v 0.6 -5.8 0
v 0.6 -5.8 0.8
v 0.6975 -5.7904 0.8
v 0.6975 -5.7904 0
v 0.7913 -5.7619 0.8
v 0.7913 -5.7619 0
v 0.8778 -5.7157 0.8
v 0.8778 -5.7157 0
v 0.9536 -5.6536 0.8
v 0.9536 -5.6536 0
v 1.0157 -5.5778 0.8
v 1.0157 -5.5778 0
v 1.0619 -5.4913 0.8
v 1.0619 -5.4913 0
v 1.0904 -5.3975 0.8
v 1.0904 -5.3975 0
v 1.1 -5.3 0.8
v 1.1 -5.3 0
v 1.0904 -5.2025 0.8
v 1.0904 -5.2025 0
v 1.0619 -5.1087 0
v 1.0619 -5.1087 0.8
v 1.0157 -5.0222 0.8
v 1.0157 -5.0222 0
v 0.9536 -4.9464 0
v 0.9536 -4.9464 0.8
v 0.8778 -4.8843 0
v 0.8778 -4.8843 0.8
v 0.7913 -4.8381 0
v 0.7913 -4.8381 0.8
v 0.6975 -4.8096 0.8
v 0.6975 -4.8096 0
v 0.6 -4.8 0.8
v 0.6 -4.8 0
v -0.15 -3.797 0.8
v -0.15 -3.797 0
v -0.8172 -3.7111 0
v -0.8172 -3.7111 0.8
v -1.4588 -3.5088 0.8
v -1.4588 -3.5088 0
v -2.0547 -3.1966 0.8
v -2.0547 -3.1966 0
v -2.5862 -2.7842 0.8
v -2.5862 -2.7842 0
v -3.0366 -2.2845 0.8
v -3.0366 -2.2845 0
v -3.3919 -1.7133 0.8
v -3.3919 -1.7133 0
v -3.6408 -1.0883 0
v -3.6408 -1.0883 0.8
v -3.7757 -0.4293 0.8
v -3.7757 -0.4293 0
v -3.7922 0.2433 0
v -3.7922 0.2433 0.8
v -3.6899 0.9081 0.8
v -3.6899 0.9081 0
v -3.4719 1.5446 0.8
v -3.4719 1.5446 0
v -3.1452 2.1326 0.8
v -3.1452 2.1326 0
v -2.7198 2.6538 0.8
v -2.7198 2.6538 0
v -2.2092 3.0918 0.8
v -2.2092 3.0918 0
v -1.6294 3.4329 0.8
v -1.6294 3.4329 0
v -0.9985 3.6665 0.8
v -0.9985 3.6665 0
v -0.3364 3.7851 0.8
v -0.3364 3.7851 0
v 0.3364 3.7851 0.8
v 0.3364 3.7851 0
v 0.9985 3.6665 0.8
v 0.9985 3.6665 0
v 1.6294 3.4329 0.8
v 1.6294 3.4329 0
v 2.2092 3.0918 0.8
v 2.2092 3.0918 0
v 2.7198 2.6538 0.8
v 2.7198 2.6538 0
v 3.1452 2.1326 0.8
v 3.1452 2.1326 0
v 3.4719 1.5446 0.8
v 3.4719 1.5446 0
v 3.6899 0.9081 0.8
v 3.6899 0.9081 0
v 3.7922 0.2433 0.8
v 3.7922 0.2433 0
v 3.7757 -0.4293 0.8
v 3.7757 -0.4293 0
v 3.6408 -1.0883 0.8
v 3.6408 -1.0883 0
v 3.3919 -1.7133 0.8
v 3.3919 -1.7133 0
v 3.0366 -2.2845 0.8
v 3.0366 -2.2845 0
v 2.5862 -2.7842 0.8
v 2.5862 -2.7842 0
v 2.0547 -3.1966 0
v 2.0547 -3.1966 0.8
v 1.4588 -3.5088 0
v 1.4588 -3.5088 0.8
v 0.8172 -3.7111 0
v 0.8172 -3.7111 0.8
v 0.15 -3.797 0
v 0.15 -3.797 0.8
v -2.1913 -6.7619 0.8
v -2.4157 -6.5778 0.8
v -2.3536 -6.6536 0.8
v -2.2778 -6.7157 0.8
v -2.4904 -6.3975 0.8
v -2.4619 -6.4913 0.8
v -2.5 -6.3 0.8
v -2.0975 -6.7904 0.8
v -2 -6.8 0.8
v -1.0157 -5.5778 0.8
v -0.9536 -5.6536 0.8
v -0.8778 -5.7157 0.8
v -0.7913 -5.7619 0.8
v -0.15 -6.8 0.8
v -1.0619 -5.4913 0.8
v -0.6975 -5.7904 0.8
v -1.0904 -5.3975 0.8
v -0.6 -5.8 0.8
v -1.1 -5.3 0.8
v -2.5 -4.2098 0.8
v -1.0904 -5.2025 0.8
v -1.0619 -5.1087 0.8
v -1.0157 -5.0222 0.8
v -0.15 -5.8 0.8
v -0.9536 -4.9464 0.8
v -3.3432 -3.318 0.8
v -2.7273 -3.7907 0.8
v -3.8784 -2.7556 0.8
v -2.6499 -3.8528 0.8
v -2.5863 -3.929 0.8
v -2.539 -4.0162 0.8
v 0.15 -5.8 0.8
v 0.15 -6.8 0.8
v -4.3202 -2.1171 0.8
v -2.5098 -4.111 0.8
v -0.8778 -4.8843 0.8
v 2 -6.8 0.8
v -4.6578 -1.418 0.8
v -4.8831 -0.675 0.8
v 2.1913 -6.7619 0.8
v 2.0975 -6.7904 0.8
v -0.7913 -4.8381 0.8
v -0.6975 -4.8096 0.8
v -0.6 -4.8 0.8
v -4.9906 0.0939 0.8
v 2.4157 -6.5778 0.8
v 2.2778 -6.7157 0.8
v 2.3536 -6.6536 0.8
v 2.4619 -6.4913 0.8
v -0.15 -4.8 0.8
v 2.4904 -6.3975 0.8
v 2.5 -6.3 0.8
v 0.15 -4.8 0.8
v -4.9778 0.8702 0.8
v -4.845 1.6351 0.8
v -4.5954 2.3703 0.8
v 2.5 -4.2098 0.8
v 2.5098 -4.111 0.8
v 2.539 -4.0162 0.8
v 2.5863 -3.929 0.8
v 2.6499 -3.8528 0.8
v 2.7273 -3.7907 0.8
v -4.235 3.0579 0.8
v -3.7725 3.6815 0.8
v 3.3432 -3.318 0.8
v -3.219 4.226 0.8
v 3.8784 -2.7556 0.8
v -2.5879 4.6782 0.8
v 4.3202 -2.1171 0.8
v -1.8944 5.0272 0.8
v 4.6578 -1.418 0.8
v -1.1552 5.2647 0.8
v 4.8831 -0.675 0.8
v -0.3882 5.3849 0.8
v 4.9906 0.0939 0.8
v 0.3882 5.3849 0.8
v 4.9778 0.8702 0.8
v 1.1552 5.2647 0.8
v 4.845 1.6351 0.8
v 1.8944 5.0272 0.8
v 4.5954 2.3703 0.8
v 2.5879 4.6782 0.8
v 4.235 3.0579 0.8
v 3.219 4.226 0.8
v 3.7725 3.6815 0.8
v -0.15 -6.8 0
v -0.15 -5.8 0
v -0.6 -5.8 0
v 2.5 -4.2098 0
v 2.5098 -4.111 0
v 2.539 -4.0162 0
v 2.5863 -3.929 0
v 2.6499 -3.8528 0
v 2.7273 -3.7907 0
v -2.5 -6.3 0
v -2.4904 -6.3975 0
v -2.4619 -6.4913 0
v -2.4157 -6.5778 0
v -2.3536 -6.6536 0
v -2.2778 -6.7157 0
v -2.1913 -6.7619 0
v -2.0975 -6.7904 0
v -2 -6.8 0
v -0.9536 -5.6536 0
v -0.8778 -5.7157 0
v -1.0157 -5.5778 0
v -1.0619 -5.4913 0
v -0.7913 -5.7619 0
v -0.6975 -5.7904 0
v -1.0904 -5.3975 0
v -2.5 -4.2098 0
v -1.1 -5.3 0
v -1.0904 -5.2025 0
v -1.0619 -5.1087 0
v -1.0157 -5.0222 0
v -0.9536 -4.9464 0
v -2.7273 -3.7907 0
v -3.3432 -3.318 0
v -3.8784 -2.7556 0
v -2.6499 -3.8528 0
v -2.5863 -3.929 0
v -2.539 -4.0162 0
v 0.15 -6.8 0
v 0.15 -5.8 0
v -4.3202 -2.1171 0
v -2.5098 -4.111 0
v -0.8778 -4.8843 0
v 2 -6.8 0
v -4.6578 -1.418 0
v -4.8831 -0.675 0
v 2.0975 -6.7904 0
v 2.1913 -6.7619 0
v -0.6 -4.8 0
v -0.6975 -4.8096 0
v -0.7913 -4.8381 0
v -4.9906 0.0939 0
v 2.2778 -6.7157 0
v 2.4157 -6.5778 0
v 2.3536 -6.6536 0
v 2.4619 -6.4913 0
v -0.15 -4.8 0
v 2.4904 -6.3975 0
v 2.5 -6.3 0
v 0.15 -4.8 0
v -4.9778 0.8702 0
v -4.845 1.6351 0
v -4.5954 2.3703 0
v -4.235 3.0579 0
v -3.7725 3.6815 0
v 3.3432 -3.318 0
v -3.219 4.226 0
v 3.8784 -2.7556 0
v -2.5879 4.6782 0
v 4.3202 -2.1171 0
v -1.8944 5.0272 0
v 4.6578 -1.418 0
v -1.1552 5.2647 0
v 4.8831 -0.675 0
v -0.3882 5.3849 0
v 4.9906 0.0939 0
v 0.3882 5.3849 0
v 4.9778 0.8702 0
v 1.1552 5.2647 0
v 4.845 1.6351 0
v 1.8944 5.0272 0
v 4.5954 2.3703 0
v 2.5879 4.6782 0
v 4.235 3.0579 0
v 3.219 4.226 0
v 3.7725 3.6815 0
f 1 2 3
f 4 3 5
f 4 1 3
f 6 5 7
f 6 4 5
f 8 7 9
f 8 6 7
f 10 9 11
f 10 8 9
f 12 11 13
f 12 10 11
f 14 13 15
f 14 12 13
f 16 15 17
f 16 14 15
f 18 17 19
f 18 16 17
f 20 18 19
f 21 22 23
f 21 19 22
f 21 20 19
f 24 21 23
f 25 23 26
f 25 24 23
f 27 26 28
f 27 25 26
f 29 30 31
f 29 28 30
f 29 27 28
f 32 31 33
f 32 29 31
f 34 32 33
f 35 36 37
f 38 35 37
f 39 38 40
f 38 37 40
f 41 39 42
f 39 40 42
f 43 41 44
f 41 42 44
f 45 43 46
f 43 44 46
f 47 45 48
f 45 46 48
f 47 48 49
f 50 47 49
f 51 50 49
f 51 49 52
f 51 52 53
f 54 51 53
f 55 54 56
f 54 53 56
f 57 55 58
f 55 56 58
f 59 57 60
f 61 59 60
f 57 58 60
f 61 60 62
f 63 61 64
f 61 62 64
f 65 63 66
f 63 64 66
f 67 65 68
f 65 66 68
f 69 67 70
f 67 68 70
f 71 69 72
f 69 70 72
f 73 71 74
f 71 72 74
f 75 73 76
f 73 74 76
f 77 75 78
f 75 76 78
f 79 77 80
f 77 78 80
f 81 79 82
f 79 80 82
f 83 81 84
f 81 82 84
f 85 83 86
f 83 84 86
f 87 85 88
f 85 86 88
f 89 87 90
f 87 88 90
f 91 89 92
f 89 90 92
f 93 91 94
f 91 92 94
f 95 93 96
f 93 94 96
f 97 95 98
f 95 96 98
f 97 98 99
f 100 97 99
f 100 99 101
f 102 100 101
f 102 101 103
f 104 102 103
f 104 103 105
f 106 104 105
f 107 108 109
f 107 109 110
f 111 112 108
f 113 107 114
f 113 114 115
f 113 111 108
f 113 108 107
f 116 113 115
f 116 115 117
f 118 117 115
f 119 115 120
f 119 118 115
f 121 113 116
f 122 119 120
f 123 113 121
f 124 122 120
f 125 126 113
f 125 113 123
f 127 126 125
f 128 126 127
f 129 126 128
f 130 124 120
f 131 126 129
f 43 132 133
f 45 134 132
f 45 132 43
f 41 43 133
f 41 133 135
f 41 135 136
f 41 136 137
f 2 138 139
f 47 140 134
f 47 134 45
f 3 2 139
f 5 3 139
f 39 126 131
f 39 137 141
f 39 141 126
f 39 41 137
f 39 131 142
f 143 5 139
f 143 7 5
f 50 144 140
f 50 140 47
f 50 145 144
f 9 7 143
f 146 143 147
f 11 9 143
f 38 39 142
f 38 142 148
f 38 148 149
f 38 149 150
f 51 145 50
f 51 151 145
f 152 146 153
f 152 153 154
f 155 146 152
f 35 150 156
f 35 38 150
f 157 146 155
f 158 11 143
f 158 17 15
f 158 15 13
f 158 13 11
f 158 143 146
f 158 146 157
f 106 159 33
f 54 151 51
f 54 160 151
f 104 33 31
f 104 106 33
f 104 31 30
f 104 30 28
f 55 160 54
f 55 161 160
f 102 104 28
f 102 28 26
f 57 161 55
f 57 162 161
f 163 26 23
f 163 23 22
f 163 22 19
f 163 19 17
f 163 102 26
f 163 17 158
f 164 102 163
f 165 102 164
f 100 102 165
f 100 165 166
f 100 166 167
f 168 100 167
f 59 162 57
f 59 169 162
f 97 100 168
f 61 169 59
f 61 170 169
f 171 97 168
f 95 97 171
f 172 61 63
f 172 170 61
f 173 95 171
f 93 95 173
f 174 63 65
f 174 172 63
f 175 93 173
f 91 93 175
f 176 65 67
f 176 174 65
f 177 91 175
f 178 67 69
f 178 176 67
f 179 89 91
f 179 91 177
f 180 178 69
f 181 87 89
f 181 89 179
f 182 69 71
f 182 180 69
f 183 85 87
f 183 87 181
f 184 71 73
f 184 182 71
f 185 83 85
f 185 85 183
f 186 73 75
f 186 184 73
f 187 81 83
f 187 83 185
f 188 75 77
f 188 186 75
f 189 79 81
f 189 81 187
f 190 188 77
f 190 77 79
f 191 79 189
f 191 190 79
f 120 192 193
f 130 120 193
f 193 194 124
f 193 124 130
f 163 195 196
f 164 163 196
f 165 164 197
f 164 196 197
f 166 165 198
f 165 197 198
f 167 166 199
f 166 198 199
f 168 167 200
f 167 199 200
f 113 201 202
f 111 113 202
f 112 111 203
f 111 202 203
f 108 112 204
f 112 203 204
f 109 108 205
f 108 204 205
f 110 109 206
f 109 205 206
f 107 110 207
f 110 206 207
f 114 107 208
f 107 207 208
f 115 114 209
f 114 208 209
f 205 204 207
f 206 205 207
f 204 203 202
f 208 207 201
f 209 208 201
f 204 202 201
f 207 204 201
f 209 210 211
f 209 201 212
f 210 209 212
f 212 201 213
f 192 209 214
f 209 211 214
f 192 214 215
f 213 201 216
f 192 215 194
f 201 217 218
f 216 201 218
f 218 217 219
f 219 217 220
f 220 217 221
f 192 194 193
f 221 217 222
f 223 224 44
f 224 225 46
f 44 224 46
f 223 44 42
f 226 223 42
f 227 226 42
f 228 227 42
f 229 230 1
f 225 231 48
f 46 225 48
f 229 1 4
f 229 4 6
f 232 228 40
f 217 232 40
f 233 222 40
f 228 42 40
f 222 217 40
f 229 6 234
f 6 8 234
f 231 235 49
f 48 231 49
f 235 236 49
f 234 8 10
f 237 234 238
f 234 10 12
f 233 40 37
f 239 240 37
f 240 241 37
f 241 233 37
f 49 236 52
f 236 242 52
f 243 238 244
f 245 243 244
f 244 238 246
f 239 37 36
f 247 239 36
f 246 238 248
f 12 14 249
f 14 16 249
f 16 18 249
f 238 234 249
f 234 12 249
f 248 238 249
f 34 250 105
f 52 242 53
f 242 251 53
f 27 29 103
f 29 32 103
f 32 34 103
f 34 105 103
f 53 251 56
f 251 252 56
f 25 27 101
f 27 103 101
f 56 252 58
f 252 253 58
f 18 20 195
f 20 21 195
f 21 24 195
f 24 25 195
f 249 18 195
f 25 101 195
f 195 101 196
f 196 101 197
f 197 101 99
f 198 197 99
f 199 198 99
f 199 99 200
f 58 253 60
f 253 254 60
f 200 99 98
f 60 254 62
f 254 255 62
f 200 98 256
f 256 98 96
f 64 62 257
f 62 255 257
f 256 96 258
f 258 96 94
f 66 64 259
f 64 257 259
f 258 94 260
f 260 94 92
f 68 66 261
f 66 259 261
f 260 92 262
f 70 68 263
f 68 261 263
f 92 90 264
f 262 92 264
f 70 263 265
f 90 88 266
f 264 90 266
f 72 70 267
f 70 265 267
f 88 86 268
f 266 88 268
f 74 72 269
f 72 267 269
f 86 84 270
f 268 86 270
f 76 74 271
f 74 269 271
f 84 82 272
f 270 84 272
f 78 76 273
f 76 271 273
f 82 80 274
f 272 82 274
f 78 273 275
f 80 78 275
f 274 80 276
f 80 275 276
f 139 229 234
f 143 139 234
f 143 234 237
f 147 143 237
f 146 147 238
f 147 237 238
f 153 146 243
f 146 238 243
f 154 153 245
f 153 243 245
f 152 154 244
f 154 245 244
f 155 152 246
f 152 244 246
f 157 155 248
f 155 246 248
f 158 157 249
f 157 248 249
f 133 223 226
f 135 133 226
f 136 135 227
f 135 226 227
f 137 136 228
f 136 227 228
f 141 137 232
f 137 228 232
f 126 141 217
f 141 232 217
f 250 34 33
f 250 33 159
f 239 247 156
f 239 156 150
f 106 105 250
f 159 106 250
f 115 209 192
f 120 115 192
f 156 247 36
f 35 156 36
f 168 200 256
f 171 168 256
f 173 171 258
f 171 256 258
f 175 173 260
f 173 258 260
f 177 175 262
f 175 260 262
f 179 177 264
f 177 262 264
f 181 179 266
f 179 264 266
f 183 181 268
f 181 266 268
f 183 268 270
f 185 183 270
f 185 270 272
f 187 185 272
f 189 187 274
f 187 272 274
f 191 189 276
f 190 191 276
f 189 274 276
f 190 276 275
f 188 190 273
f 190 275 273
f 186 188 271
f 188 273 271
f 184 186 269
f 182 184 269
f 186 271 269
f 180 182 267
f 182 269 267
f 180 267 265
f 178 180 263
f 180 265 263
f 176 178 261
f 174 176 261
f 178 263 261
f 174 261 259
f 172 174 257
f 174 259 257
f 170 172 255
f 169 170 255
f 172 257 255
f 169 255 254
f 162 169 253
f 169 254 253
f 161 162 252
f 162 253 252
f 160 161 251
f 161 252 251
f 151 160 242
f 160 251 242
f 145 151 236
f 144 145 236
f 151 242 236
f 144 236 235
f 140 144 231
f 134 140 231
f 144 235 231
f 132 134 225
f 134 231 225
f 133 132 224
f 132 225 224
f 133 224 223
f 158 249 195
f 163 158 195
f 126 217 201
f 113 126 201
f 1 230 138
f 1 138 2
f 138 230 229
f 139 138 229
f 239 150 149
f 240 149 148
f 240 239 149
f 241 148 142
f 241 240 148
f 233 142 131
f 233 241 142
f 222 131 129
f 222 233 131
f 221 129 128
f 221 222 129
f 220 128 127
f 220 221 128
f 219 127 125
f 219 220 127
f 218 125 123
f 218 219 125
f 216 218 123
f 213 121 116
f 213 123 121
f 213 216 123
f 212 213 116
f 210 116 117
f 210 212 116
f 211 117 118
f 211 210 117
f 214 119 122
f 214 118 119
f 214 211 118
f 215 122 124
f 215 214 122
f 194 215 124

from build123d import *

# Parameters (mm, degrees)
BOSS_EXTRUDE1_DEPTH = 0.8
SKETCH2_R           = 0.5
CUT_EXTRUDE1_DEPTH  = 9.478207358
DELETEFACE1_DEPTH   = 0.8
CUT_EXTRUDE2_DEPTH  = 9.478207358


# Read off the part's stored shape, not the designer's step: DeleteFace1
with BuildPart() as part:
    # Sketch1 → Boss-Extrude1 (new body)
    with BuildSketch(Plane.XY):
        with BuildLine():
            Line((-2.5, -4.209772229), (-2.5, -6.3))
            ThreePointArc((-2.5, -6.3), (-2.353553391, -6.653553391), (-2, -6.8))
            Line((-2, -6.8), (-0.15, -6.8))
            Line((-0.15, -6.8), (-0.15, -3.79703832))
            ThreePointArc((-0.15, -3.79703832), (0, 3.8), (0.15, -3.79703832))
            Line((0.15, -3.79703832), (0.15, -6.8))
            Line((0.15, -6.8), (2, -6.8))
            ThreePointArc((2, -6.8), (2.353553391, -6.653553391), (2.5, -6.3))
            Line((2.5, -6.3), (2.5, -4.209772229))
            ThreePointArc((2.5, -4.209772229), (2.560475464, -3.971406581), (2.727272727, -3.790702026))
            ThreePointArc((2.727272727, -3.790702026), (0, 5.4), (-2.727272727, -3.790702026))
            ThreePointArc((-2.727272727, -3.790702026), (-2.560475464, -3.971406581), (-2.5, -4.209772229))
        make_face()
    extrude(amount=BOSS_EXTRUDE1_DEPTH)

    # Sketch2 → Cut-Extrude1 (cut, through all)
    with BuildSketch(Plane(origin=(0, 0, 0), x_dir=(-1, 0, 0), z_dir=(0, 0, -1))):
        with Locations((-0.6, -5.3)):
            Circle(SKETCH2_R)
        with Locations((0.6, -5.3)):
            Circle(SKETCH2_R)
    extrude(amount=-CUT_EXTRUDE1_DEPTH, mode=Mode.SUBTRACT)

    # DeleteFace1 outline → DeleteFace1 (add)
    with BuildSketch(Plane.XY):
        with BuildLine():
            Line((-0.15, -5.517944947), (-0.15, -5.082055053))
            ThreePointArc((-0.15, -5.082055053), (-1.1, -5.3), (-0.15, -5.517944947))
        make_face()
        with BuildLine():
            Line((0.15, -5.082055053), (0.15, -5.517944947))
            ThreePointArc((0.15, -5.517944947), (1.1, -5.3), (0.15, -5.082055053))
        make_face()
    extrude(amount=DELETEFACE1_DEPTH)

    # Sketch3 → Cut-Extrude2 (cut, through all)
    with BuildSketch(Plane(origin=(0, 0, 0), x_dir=(-1, 0, 0), z_dir=(0, 0, -1))):
        with BuildLine():
            Line((-0.6, -4.8), (0.6, -4.8))
            ThreePointArc((0.6, -4.8), (1.1, -5.3), (0.6, -5.8))
            Line((0.6, -5.8), (-0.6, -5.8))
            ThreePointArc((-0.6, -5.8), (-1.1, -5.3), (-0.6, -4.8))
        make_face()
    extrude(amount=-CUT_EXTRUDE2_DEPTH, mode=Mode.SUBTRACT)


solid = part.part
